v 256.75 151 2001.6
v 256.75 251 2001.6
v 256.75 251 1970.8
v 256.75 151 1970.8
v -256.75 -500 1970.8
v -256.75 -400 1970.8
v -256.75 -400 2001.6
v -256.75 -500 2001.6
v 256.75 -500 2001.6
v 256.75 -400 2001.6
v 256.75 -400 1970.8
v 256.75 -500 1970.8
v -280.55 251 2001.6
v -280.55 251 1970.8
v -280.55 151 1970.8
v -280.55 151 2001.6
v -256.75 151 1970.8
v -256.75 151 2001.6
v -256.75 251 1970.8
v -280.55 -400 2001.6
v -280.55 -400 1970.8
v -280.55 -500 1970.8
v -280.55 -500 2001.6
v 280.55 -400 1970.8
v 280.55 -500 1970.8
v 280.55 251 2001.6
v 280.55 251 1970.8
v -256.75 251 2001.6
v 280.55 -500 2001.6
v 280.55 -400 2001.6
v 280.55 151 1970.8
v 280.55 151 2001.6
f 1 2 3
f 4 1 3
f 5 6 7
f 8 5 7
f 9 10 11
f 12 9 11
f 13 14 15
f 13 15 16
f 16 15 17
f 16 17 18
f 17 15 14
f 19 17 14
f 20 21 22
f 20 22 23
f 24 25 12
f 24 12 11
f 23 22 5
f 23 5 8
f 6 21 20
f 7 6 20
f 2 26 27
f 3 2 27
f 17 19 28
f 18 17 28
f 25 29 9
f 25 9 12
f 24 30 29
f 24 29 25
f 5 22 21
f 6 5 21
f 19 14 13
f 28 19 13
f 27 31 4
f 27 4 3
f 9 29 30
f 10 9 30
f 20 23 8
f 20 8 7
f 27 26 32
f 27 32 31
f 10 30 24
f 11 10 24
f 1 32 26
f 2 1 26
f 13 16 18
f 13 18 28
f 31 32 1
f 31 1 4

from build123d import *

# Parameters (mm, degrees)
SKETCH5_W           = 30.8
SKETCH5_H           = 100
BOSS_EXTRUDE2_DEPTH = 23.8
SKETCH10_W          = 30.8
SKETCH10_H          = 100
BOSS_EXTRUDE3_DEPTH = 23.8
SKETCH15_W          = 30.8
SKETCH15_H          = 100
BOSS_EXTRUDE4_DEPTH = 23.8
SKETCH21_W          = 30.8
SKETCH21_H          = 100
BOSS_EXTRUDE5_DEPTH = 23.8


with BuildPart() as part:
    # Sketch5 → Boss-Extrude2 (new body)
    with BuildSketch(Plane(origin=(280.55, 0, 0), x_dir=(0, 0, -1), z_dir=(1, 0, 0))):
        with Locations((-1986.2, -450)):
            Rectangle(SKETCH5_W, SKETCH5_H)
    extrude(amount=-BOSS_EXTRUDE2_DEPTH)


with BuildPart() as body_2:
    # Sketch10 → Boss-Extrude3 (new body)
    with BuildSketch(Plane(origin=(280.55, 0, 0), x_dir=(0, 0, -1), z_dir=(1, 0, 0))):
        with Locations((-1986.2, 201)):
            Rectangle(SKETCH10_W, SKETCH10_H)
    extrude(amount=-BOSS_EXTRUDE3_DEPTH)


with BuildPart() as body_3:
    # Sketch15 → Boss-Extrude4 (new body)
    with BuildSketch(Plane.ZY.offset(280.55)):
        with Locations((1986.2, -450)):
            Rectangle(SKETCH15_W, SKETCH15_H)
    extrude(amount=-BOSS_EXTRUDE4_DEPTH)


with BuildPart() as body_4:
    # Sketch21 → Boss-Extrude5 (new body)
    with BuildSketch(Plane.ZY.offset(280.55)):
        with Locations((1986.2, 201)):
            Rectangle(SKETCH21_W, SKETCH21_H)
    extrude(amount=-BOSS_EXTRUDE5_DEPTH)


solid = Compound([part.part, body_2.part, body_3.part, body_4.part])
